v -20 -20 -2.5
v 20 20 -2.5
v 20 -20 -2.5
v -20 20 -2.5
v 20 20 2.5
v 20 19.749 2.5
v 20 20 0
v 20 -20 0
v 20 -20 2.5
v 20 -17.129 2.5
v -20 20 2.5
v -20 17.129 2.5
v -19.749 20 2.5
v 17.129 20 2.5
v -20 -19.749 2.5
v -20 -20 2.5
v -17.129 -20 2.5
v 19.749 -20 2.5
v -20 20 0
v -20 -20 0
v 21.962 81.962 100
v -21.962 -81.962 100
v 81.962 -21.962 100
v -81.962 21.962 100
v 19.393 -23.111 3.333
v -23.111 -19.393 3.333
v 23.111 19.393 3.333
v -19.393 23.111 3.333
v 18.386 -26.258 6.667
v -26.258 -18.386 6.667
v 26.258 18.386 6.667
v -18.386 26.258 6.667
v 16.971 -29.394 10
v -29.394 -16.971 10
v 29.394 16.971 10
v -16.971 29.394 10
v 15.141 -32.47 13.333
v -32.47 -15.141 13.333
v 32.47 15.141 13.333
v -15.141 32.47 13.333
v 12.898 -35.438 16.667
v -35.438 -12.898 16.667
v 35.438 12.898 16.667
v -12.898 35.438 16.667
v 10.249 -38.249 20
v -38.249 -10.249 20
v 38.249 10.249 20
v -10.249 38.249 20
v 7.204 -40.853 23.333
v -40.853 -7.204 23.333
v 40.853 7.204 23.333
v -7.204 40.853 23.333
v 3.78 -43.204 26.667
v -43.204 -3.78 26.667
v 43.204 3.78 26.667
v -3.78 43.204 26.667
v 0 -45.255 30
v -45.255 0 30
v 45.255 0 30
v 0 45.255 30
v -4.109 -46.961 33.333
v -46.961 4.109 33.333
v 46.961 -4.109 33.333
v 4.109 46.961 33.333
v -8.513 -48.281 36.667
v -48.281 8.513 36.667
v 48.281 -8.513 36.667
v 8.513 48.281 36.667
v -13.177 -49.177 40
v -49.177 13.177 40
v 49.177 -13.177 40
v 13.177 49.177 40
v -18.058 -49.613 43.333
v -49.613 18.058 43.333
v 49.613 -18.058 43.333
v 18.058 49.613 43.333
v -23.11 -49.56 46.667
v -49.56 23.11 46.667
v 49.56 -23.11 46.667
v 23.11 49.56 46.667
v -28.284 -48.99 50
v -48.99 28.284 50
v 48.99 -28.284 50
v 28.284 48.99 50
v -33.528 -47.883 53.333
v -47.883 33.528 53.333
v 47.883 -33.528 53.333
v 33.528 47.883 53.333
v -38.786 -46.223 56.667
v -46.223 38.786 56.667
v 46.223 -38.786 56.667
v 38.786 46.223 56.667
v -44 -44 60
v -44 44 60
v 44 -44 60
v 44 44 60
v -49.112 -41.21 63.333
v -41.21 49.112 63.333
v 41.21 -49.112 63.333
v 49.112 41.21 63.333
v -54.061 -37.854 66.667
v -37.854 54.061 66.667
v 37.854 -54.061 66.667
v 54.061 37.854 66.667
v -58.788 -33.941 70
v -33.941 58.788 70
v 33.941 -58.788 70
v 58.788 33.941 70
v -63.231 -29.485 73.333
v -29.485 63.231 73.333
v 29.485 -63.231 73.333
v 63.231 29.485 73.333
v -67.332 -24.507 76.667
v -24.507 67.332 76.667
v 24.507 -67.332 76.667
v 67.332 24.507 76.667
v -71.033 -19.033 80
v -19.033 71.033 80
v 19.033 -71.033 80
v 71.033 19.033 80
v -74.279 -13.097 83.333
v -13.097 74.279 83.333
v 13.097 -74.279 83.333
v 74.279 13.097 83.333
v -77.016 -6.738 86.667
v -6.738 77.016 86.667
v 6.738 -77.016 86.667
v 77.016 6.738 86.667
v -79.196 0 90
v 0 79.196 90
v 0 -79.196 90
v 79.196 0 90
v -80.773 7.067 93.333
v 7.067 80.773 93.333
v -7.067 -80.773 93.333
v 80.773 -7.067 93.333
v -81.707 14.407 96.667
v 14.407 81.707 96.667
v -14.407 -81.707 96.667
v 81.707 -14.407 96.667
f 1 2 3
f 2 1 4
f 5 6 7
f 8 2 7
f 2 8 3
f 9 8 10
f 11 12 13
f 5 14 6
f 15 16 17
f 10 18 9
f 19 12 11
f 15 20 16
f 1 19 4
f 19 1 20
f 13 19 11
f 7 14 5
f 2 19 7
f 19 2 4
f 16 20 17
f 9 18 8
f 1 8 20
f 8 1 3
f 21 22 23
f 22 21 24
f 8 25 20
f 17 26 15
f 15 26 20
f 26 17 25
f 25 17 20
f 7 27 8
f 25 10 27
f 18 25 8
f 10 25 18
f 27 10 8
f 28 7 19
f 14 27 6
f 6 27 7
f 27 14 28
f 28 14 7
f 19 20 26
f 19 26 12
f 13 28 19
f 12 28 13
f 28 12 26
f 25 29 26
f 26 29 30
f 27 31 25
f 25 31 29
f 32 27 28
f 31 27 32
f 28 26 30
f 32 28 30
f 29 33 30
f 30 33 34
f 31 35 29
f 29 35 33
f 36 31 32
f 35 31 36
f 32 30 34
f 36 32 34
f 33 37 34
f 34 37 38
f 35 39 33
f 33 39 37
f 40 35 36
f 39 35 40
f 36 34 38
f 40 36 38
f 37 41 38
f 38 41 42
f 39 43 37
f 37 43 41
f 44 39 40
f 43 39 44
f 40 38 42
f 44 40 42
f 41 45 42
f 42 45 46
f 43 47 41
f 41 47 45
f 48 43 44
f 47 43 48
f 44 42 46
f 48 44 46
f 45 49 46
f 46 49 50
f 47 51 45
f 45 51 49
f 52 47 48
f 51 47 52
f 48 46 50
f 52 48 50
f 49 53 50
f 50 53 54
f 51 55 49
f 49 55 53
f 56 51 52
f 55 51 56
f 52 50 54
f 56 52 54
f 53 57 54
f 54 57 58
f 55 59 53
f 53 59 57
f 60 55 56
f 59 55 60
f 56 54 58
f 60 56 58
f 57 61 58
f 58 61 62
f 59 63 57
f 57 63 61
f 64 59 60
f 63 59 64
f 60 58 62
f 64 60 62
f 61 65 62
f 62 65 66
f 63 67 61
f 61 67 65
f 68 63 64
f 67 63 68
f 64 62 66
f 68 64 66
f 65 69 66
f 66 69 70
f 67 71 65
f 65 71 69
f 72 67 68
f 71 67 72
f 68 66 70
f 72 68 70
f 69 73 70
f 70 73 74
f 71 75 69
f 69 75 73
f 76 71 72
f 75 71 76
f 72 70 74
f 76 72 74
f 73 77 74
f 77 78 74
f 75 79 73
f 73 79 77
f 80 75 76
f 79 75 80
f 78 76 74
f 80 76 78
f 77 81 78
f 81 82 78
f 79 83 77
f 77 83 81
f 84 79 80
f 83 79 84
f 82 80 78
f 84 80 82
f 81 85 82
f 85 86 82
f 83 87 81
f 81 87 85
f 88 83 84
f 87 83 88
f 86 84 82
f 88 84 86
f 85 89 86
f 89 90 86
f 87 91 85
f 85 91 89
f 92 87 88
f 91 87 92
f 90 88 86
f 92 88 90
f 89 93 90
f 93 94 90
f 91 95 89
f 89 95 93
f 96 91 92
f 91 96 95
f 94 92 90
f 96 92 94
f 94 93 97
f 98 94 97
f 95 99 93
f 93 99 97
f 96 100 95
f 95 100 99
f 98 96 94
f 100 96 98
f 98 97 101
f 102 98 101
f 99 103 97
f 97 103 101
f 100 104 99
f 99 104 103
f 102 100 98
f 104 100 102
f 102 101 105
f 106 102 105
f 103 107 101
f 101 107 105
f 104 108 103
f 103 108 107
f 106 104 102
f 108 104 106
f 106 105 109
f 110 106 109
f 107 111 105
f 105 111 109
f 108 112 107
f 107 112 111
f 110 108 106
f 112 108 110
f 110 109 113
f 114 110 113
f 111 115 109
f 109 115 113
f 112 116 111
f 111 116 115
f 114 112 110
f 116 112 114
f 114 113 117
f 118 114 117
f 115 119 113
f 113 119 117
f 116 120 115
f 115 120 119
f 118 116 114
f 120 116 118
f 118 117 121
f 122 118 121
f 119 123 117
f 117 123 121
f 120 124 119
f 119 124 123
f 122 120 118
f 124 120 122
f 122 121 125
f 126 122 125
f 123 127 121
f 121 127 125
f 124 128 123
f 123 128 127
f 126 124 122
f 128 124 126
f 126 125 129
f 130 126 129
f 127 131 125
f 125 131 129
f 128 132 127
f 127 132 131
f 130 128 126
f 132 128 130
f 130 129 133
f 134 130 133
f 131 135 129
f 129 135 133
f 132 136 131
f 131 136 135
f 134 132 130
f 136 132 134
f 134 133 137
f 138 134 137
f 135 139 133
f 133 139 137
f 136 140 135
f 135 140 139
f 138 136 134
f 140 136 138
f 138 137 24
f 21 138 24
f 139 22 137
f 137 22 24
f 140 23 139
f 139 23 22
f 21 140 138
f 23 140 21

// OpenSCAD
//
// Volcanoe
//

//
//  parameters
//
tube_dia = 5;
thickness = 2;
base_length = 40;
base_height = 5;
model_height = 30;
fuzz_factor = 0.20;

// base
module base() {
	cube([base_length, base_length, base_height], center = true);
}

module sides() {
	linear_extrude(h=model_height, convexity=10, twist=150, slices=30, scale=3) {
		square(base_length, center=true);
	}
}


// eruption tube
module eruption_tube() {
	translate([0,0,model_height/2 - base_height/2])
	difference() {	
		cylinder(r=tube_dia, h=model_height, center=true);
		cylinder(r=tube_dia - thickness, h=model_height + 1, center=true);
	}
}


// assembly
module main() {
	union() {
		base();
		eruption_tube();
		sides();
	}
}

main();
